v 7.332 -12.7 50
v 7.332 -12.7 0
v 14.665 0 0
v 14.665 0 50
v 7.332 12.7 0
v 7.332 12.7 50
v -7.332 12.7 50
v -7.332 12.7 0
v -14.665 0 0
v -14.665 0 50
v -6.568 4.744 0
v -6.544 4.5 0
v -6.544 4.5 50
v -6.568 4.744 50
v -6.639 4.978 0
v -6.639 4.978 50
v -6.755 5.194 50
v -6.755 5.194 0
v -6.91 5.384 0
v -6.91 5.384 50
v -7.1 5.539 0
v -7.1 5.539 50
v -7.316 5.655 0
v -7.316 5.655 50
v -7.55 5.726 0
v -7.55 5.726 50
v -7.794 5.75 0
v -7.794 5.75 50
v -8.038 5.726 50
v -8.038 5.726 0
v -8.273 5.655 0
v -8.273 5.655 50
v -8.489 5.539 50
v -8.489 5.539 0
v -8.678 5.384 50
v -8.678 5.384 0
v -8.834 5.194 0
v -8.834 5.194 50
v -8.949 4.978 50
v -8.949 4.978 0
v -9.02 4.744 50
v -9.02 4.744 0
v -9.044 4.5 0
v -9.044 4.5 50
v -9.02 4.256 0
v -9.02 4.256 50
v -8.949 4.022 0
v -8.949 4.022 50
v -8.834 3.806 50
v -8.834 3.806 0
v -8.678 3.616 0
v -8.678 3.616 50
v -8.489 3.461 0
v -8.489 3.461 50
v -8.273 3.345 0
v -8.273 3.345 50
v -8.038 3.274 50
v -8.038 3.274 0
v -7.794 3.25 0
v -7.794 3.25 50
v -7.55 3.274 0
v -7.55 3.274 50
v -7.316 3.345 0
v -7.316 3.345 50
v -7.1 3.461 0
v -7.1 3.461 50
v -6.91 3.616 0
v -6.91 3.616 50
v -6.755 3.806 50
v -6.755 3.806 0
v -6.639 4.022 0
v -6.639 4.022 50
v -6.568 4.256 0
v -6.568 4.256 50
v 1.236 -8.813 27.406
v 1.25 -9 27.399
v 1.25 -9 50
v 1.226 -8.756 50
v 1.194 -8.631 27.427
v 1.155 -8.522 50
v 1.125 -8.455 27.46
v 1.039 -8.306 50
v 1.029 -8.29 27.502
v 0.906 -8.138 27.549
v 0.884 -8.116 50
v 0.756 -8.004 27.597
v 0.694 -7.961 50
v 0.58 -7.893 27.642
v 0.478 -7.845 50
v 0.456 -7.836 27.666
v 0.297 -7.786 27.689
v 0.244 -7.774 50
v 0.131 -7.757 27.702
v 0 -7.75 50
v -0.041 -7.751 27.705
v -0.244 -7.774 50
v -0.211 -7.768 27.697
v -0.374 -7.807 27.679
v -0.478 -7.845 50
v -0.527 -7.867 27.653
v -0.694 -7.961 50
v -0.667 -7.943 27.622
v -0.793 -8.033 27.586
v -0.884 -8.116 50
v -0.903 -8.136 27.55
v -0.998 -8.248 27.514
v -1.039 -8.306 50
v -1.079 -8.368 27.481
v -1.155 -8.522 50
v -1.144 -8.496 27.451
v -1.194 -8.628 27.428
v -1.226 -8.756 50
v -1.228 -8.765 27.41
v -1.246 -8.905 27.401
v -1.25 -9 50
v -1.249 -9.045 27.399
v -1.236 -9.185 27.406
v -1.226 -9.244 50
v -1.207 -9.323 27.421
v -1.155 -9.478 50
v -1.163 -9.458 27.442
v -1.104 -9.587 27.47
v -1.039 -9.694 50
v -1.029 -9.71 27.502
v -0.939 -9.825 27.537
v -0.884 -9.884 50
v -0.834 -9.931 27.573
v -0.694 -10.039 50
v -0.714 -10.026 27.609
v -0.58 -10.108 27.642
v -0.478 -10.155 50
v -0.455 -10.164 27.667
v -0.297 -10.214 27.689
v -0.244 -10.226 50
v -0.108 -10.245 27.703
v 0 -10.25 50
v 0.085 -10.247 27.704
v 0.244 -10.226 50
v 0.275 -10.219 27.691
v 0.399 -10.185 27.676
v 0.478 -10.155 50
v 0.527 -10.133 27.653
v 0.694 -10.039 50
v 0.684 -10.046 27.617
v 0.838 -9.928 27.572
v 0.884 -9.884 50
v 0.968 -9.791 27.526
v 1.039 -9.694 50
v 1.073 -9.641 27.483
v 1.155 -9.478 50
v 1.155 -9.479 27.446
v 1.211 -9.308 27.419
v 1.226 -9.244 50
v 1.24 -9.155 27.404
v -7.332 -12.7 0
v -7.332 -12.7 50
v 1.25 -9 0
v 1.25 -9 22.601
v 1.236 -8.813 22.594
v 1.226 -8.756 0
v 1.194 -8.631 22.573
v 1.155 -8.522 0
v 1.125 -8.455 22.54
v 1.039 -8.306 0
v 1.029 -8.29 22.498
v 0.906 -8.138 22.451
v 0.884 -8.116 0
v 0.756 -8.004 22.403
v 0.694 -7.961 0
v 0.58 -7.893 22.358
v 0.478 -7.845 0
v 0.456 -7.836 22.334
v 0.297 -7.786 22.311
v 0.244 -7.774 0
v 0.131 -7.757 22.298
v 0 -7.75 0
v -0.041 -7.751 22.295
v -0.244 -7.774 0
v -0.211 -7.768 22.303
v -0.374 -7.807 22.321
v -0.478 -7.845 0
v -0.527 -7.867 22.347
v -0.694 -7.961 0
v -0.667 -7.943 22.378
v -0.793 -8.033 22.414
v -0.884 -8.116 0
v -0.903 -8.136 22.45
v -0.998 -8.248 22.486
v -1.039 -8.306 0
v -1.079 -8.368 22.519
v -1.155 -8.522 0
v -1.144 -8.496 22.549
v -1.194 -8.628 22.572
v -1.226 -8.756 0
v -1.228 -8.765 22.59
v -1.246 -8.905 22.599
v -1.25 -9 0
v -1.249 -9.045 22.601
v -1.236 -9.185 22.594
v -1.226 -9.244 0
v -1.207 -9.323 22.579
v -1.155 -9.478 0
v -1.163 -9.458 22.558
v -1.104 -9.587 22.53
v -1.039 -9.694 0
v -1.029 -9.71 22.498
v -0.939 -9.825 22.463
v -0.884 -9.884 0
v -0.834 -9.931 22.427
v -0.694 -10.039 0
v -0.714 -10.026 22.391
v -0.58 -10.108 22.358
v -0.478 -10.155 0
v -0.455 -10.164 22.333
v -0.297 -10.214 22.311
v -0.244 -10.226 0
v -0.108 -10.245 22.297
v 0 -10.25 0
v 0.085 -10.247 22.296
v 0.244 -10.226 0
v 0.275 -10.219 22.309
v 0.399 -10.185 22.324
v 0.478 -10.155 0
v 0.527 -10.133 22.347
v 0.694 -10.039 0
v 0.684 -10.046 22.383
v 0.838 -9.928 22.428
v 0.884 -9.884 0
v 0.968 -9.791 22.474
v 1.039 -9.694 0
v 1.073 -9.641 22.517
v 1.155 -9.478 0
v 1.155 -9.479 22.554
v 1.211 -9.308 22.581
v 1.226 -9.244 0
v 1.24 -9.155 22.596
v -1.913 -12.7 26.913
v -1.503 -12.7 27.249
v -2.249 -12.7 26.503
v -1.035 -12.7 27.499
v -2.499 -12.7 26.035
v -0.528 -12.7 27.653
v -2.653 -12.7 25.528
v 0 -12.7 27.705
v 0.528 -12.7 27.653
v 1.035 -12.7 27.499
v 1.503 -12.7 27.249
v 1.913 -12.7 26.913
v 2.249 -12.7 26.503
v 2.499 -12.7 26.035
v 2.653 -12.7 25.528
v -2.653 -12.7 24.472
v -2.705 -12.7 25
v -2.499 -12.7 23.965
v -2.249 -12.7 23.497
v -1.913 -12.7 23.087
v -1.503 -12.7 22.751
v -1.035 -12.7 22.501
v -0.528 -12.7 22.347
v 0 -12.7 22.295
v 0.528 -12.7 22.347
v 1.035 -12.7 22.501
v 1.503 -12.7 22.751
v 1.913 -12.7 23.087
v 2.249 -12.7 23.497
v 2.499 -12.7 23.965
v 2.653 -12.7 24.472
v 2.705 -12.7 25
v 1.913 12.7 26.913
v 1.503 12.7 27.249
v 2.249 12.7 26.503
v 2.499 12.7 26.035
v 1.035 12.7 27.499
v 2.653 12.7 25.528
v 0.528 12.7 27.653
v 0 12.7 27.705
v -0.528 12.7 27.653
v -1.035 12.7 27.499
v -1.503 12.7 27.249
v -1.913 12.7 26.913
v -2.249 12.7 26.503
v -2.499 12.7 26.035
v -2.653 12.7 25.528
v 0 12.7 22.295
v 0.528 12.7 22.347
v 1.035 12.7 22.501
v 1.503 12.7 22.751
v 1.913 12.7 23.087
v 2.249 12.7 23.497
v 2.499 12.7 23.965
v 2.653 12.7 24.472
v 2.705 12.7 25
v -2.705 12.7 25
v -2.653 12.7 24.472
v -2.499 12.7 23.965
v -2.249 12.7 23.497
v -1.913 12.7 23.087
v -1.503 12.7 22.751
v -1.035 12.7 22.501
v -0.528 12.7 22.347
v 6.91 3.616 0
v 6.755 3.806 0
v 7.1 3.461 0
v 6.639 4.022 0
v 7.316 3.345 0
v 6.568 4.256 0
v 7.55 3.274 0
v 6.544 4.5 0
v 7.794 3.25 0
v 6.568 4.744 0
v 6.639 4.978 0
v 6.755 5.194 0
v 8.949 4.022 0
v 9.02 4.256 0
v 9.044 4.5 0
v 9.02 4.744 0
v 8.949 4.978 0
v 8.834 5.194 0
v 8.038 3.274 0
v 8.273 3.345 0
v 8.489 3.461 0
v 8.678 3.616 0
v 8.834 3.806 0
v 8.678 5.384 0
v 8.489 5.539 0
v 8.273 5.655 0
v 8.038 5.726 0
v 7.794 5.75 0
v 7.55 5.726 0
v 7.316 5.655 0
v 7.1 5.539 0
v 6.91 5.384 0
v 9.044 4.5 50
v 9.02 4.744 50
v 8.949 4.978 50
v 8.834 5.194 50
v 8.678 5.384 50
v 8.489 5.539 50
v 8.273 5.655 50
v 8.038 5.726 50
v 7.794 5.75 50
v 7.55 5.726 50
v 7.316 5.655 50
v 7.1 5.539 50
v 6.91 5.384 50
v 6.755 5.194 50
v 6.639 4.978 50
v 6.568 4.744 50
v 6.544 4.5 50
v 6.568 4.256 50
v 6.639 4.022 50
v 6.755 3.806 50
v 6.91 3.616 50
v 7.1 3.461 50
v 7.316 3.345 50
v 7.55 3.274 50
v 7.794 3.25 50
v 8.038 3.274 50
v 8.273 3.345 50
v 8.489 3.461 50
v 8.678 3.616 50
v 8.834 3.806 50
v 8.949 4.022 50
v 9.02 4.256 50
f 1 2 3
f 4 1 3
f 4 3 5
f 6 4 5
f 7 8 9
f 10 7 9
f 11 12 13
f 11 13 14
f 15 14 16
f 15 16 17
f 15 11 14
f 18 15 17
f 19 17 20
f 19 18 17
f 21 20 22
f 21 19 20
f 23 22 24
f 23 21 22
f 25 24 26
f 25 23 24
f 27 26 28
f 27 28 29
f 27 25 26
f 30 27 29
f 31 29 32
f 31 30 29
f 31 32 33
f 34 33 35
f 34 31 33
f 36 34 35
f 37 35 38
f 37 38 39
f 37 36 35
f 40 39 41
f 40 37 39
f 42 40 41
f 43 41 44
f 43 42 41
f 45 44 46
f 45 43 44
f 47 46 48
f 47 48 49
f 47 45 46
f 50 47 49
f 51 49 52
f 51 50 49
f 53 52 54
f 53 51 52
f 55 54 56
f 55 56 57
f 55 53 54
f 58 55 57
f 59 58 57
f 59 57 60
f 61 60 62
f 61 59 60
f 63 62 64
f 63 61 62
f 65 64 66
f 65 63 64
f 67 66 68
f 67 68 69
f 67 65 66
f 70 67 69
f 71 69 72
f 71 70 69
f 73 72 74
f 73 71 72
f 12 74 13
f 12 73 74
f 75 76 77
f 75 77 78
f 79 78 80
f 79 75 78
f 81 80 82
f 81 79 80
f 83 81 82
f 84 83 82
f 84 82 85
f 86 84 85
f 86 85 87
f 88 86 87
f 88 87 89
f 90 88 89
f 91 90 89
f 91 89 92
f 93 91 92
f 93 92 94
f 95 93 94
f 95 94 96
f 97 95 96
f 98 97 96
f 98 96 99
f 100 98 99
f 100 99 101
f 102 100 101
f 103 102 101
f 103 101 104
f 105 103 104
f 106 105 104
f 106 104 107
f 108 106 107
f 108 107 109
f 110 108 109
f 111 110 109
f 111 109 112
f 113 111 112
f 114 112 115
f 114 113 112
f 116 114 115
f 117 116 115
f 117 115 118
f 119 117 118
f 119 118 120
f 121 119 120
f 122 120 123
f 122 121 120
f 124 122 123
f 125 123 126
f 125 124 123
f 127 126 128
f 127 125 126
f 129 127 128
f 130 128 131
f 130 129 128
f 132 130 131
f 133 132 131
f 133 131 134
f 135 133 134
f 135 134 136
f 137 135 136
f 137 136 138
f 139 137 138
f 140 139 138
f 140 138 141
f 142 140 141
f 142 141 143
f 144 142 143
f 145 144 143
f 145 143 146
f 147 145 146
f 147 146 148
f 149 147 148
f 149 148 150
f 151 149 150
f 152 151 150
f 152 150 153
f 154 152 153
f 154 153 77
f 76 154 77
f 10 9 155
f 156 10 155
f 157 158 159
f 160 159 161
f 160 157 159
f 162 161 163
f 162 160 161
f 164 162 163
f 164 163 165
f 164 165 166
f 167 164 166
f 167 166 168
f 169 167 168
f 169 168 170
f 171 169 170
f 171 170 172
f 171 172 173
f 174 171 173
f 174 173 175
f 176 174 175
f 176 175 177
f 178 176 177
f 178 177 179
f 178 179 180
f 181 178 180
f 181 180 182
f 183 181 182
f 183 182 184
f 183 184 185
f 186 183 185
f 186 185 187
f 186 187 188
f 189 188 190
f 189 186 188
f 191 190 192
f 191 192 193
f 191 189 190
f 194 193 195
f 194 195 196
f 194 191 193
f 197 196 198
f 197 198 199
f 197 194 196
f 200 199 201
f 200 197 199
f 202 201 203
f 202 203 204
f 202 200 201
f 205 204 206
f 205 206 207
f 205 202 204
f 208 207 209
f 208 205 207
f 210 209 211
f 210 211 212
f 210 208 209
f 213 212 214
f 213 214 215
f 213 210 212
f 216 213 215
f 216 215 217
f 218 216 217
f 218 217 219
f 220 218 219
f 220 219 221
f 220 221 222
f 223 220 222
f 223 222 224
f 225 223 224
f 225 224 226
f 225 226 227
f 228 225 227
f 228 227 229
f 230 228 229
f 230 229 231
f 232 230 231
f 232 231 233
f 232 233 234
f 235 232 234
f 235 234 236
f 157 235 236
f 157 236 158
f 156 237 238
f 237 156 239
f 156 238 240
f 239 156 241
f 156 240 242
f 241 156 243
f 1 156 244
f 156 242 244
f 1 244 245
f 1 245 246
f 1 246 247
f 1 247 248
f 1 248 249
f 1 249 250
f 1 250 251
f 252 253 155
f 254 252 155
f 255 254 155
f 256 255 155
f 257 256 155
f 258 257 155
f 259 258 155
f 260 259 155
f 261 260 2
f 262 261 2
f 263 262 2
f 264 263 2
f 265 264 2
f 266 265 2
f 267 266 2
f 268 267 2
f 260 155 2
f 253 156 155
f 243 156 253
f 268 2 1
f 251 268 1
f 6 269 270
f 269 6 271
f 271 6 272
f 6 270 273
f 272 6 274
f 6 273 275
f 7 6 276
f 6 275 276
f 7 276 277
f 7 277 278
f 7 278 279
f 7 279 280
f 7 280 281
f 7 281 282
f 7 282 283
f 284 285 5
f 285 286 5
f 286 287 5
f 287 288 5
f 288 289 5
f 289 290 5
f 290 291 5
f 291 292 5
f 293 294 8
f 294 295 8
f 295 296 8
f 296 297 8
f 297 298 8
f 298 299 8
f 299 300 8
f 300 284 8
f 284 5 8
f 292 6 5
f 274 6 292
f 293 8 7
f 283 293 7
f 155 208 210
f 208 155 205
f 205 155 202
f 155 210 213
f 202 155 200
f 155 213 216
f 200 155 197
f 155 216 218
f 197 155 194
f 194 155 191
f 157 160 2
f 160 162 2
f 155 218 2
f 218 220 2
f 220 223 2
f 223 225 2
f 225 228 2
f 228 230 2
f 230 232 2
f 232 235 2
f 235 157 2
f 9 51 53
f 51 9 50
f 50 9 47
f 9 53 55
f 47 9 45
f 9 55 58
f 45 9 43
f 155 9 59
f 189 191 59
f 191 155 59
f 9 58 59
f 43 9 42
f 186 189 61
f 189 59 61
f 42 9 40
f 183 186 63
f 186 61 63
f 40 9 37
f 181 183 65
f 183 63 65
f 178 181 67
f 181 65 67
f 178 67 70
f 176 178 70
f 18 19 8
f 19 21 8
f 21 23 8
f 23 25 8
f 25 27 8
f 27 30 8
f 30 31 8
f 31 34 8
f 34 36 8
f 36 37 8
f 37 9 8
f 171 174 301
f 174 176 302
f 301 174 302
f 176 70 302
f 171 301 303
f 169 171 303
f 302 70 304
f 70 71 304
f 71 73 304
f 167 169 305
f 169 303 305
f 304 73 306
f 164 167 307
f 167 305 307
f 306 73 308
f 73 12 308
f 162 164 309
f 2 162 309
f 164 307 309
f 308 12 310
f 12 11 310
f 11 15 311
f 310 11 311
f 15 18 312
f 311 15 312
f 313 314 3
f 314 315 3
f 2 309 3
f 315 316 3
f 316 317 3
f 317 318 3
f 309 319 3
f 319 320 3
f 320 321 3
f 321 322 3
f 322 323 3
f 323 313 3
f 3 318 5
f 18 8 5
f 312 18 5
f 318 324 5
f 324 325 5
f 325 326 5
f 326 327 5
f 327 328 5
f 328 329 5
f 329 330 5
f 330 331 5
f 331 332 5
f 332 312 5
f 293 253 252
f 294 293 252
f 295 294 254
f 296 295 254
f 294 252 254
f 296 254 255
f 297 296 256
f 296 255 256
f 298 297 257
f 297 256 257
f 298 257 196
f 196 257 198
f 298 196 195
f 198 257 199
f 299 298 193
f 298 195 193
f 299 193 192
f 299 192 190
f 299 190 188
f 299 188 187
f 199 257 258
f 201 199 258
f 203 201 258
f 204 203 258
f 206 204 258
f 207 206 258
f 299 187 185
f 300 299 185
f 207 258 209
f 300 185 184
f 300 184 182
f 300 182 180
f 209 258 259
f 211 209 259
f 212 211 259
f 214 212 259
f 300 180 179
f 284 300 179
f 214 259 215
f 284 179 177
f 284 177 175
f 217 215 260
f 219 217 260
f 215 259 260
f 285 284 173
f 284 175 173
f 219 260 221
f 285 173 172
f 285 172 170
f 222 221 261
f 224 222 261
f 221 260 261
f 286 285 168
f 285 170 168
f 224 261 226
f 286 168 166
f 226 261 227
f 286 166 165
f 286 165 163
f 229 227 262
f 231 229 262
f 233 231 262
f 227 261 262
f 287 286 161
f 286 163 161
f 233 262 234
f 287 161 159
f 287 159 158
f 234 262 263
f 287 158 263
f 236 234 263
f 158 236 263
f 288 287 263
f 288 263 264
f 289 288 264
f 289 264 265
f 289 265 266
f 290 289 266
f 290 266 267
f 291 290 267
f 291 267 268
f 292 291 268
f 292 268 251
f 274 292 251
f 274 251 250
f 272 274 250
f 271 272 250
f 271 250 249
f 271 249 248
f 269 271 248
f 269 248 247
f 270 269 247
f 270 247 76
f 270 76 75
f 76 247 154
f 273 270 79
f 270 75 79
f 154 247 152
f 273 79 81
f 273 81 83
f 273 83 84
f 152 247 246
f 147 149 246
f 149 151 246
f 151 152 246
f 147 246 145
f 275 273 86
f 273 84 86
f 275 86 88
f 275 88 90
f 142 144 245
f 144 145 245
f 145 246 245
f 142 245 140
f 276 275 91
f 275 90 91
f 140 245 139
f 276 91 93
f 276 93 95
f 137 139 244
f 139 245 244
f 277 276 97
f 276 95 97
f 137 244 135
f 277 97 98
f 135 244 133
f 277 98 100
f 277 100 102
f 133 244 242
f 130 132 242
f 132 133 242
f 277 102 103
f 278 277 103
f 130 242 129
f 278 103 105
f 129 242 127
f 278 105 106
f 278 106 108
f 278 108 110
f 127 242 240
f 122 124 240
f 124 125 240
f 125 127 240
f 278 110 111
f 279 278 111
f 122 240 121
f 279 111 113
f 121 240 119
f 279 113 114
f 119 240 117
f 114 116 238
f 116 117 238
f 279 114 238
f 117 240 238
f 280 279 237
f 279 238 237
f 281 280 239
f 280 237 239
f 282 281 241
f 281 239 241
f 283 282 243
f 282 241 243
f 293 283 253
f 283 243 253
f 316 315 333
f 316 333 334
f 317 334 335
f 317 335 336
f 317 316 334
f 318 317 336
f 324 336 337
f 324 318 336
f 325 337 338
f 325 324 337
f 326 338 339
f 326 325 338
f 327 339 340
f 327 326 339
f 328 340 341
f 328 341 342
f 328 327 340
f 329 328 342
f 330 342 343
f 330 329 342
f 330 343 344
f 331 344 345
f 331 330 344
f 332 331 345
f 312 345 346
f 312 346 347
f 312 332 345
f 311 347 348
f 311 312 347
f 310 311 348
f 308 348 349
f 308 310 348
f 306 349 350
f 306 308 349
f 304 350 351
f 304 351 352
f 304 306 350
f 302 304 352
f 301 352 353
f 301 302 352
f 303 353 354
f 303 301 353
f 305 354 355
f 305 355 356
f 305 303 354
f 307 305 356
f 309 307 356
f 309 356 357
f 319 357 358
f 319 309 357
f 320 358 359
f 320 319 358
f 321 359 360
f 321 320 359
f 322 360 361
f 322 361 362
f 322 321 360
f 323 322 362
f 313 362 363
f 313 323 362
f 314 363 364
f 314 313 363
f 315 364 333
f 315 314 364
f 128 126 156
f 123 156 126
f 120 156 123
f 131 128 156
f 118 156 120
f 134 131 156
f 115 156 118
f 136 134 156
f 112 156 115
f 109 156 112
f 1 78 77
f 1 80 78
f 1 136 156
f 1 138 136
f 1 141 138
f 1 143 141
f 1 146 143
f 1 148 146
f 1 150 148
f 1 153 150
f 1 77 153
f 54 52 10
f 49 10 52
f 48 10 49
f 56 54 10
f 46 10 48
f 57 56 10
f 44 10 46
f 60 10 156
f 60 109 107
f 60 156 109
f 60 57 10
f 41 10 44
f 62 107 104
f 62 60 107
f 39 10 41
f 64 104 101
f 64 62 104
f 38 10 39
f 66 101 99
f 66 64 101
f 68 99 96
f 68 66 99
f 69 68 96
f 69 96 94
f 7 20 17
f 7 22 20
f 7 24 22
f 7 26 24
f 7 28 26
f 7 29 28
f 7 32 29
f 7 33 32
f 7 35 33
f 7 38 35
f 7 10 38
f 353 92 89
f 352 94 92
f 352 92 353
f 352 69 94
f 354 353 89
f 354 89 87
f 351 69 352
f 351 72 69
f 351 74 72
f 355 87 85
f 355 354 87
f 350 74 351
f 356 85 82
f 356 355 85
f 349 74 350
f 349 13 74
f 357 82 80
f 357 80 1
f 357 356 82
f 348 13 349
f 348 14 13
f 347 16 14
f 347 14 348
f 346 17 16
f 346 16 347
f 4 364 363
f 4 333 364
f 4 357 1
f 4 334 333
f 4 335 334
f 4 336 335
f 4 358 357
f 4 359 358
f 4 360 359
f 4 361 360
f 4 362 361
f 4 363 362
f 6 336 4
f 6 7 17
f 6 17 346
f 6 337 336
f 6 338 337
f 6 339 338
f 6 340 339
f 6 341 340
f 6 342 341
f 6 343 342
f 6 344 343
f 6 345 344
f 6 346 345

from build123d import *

# Parameters (mm, degrees)
SKETCH1_R               = 1.25
BOSS_EXTRUDE1_DEPTH     = 50
F_1_4_28_TAPPED_HOLE1_D = 5.4102


with BuildPart() as part:
    # Sketch1 → Boss-Extrude1 (new body)
    with BuildSketch(Plane.XY):
        Polygon((-7.332348419, -12.7), (7.332348419, -12.7), (14.664696837, 0), (7.332348419, 12.7), (-7.332348419, 12.7), (-14.664696837, 0), align=None)
        with Locations((-7.794228634, 4.5)):
            Circle(SKETCH1_R, mode=Mode.SUBTRACT)
        with Locations((7.794228634, 4.5)):
            Circle(SKETCH1_R, mode=Mode.SUBTRACT)
        with Locations((0, -9)):
            Circle(SKETCH1_R, mode=Mode.SUBTRACT)
    extrude(amount=BOSS_EXTRUDE1_DEPTH)

    # 1/4-28 Tapped Hole1 (through all)
    with Locations(Plane(origin=(0, 12.7, 0), x_dir=(1, 0, 0), z_dir=(0, 1, 0))):
        with Locations((0, -25)):
            Hole(F_1_4_28_TAPPED_HOLE1_D / 2)


solid = part.part
